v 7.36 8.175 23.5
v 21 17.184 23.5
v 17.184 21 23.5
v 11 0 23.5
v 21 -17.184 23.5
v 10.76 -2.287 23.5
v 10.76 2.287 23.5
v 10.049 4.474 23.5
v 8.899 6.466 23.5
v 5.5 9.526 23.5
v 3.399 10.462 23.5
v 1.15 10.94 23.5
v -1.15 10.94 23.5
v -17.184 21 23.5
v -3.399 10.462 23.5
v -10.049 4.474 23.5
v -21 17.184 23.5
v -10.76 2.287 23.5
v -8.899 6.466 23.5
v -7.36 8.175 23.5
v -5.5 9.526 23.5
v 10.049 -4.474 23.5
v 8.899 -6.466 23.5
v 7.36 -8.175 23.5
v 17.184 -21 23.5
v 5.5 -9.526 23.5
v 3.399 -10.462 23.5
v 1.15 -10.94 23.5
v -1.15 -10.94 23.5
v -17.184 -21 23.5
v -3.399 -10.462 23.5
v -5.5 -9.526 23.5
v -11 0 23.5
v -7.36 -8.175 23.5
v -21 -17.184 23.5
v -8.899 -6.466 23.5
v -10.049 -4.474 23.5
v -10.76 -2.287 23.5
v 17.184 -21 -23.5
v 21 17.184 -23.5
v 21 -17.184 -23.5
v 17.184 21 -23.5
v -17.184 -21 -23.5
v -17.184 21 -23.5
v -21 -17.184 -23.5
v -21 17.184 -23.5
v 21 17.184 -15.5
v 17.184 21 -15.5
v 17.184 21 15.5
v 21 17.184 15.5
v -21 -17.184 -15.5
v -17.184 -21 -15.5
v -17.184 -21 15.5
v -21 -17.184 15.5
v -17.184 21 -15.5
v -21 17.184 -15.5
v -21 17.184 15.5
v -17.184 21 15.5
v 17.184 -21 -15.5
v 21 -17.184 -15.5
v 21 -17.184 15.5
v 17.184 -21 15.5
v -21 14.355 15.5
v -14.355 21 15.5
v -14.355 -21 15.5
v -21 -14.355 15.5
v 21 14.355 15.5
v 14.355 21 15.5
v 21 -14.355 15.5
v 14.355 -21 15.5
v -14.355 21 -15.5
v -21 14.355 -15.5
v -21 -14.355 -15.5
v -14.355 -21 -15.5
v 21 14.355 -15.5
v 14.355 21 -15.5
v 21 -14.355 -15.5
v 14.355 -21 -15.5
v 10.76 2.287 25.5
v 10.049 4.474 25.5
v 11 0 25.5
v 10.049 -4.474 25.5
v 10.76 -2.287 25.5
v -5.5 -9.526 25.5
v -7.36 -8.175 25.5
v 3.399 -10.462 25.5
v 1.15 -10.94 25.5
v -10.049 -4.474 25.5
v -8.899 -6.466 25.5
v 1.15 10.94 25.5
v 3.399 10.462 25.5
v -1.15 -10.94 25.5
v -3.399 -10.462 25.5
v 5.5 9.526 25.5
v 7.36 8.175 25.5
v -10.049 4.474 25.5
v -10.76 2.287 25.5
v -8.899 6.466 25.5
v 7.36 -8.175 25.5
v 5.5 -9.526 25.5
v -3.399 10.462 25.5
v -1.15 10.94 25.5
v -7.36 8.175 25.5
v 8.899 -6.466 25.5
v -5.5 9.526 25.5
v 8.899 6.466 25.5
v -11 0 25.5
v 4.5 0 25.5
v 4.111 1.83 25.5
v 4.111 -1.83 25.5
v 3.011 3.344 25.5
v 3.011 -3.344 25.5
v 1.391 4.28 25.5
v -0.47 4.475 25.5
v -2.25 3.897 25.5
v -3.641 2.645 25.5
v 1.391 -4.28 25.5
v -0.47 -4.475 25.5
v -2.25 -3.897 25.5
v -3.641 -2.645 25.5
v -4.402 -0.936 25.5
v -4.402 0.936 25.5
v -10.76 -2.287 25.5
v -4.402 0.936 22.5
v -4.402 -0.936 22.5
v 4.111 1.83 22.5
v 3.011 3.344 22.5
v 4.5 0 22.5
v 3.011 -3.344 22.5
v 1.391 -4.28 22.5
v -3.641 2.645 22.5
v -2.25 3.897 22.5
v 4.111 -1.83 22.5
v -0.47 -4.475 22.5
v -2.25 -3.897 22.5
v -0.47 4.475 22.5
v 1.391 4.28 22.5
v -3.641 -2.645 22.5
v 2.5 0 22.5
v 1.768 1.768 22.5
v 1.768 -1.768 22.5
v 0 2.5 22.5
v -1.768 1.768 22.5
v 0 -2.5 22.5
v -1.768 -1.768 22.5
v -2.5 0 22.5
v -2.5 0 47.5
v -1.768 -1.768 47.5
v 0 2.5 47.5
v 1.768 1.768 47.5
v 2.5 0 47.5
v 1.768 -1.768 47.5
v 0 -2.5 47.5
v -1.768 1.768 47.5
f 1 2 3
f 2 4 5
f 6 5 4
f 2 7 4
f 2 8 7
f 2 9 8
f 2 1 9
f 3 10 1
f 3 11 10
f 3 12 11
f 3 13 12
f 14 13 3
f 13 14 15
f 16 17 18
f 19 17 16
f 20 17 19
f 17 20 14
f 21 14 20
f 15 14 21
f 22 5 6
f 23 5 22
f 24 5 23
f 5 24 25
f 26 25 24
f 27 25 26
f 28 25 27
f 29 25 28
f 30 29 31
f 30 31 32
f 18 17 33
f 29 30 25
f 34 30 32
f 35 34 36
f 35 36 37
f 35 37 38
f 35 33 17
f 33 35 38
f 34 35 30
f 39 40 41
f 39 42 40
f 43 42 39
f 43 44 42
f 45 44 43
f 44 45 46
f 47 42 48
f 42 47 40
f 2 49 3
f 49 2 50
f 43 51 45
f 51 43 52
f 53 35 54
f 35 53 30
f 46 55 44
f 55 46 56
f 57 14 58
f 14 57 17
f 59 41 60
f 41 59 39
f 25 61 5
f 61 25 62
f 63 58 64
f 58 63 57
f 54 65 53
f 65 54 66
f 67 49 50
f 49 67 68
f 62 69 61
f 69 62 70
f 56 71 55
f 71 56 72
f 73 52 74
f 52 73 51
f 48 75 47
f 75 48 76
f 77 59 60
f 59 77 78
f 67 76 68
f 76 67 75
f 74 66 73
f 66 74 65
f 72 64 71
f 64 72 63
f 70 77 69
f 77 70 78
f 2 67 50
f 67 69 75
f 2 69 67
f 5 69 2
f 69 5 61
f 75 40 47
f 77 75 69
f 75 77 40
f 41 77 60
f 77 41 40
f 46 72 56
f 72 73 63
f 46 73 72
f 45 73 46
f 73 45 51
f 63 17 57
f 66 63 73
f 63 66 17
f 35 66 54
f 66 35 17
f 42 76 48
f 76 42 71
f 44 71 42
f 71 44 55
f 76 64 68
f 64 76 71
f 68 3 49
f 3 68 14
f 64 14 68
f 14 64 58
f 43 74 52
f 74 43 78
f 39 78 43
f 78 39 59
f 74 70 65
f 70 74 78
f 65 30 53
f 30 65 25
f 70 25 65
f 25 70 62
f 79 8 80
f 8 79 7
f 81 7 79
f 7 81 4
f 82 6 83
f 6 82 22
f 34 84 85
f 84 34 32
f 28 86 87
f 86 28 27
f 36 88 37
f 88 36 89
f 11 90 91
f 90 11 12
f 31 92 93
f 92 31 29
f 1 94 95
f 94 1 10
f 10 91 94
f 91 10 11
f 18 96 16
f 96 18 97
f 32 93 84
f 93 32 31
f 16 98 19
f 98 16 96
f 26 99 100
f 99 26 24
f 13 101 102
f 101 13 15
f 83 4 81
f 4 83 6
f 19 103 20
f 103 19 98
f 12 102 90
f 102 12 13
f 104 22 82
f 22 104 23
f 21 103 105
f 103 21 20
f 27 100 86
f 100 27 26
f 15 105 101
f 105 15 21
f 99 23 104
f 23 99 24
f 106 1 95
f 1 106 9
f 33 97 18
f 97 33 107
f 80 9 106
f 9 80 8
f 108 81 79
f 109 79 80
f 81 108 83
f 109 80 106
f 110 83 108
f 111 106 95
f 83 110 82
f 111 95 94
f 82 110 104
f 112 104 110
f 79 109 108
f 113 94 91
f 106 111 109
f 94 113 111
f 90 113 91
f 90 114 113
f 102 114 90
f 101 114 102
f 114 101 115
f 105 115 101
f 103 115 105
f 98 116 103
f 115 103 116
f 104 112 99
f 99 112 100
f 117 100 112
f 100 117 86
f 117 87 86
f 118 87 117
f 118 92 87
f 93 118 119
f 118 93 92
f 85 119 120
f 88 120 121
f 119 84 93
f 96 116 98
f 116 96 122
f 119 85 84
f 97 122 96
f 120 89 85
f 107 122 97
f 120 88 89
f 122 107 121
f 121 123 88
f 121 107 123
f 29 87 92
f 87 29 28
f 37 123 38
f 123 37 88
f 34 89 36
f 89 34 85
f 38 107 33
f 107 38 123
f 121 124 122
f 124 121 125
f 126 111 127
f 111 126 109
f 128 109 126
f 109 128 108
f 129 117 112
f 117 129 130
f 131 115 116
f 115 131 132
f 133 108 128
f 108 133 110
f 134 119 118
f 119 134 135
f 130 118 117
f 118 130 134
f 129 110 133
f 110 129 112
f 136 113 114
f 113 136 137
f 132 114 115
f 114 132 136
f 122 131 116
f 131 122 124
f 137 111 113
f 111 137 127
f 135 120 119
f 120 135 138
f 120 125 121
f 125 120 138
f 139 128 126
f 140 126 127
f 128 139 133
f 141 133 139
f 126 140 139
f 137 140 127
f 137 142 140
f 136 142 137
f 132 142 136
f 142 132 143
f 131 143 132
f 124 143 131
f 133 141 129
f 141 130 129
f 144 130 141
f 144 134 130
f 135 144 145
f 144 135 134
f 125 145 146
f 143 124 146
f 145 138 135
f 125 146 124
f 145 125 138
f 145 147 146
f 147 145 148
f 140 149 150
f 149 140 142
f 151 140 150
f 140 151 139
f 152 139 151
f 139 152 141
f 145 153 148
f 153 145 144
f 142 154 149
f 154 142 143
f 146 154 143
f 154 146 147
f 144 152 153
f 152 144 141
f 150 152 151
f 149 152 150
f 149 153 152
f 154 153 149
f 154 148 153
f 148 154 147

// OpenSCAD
// NEMA stepper motor

module nema(type){

	height	= [47];
	side		= [42];
	border	= [8];

	difference(){
		union(){

			difference(){
				cube([side[type], side[type], height[type]], center=true);
				
				rotate([0, 0, 45])
					difference(){
						cube([60,60,height[type]], center=true);
						cube([54,54,height[type]], center=true);
					}

				rotate([0, 0, 45])
					difference(){
						cube([60, 60, height[type] - 2*border[0]], center=true);
						cube([50, 50, height[type]], center=true);
					}
			} // difference

			translate([0, 0, height[type]/2])
				cylinder(h=2, r1=11, r2=11);
		} // union
		translate([0, 0, height[type]/2 - 1])
			cylinder(h=3, r1=4.5, r2=4.5);
	} // difference

	translate([0, 0, height[type]/2 - 1])
		cylinder(h=25, r1=2.5, r2=2.5);

}

nema(0);
